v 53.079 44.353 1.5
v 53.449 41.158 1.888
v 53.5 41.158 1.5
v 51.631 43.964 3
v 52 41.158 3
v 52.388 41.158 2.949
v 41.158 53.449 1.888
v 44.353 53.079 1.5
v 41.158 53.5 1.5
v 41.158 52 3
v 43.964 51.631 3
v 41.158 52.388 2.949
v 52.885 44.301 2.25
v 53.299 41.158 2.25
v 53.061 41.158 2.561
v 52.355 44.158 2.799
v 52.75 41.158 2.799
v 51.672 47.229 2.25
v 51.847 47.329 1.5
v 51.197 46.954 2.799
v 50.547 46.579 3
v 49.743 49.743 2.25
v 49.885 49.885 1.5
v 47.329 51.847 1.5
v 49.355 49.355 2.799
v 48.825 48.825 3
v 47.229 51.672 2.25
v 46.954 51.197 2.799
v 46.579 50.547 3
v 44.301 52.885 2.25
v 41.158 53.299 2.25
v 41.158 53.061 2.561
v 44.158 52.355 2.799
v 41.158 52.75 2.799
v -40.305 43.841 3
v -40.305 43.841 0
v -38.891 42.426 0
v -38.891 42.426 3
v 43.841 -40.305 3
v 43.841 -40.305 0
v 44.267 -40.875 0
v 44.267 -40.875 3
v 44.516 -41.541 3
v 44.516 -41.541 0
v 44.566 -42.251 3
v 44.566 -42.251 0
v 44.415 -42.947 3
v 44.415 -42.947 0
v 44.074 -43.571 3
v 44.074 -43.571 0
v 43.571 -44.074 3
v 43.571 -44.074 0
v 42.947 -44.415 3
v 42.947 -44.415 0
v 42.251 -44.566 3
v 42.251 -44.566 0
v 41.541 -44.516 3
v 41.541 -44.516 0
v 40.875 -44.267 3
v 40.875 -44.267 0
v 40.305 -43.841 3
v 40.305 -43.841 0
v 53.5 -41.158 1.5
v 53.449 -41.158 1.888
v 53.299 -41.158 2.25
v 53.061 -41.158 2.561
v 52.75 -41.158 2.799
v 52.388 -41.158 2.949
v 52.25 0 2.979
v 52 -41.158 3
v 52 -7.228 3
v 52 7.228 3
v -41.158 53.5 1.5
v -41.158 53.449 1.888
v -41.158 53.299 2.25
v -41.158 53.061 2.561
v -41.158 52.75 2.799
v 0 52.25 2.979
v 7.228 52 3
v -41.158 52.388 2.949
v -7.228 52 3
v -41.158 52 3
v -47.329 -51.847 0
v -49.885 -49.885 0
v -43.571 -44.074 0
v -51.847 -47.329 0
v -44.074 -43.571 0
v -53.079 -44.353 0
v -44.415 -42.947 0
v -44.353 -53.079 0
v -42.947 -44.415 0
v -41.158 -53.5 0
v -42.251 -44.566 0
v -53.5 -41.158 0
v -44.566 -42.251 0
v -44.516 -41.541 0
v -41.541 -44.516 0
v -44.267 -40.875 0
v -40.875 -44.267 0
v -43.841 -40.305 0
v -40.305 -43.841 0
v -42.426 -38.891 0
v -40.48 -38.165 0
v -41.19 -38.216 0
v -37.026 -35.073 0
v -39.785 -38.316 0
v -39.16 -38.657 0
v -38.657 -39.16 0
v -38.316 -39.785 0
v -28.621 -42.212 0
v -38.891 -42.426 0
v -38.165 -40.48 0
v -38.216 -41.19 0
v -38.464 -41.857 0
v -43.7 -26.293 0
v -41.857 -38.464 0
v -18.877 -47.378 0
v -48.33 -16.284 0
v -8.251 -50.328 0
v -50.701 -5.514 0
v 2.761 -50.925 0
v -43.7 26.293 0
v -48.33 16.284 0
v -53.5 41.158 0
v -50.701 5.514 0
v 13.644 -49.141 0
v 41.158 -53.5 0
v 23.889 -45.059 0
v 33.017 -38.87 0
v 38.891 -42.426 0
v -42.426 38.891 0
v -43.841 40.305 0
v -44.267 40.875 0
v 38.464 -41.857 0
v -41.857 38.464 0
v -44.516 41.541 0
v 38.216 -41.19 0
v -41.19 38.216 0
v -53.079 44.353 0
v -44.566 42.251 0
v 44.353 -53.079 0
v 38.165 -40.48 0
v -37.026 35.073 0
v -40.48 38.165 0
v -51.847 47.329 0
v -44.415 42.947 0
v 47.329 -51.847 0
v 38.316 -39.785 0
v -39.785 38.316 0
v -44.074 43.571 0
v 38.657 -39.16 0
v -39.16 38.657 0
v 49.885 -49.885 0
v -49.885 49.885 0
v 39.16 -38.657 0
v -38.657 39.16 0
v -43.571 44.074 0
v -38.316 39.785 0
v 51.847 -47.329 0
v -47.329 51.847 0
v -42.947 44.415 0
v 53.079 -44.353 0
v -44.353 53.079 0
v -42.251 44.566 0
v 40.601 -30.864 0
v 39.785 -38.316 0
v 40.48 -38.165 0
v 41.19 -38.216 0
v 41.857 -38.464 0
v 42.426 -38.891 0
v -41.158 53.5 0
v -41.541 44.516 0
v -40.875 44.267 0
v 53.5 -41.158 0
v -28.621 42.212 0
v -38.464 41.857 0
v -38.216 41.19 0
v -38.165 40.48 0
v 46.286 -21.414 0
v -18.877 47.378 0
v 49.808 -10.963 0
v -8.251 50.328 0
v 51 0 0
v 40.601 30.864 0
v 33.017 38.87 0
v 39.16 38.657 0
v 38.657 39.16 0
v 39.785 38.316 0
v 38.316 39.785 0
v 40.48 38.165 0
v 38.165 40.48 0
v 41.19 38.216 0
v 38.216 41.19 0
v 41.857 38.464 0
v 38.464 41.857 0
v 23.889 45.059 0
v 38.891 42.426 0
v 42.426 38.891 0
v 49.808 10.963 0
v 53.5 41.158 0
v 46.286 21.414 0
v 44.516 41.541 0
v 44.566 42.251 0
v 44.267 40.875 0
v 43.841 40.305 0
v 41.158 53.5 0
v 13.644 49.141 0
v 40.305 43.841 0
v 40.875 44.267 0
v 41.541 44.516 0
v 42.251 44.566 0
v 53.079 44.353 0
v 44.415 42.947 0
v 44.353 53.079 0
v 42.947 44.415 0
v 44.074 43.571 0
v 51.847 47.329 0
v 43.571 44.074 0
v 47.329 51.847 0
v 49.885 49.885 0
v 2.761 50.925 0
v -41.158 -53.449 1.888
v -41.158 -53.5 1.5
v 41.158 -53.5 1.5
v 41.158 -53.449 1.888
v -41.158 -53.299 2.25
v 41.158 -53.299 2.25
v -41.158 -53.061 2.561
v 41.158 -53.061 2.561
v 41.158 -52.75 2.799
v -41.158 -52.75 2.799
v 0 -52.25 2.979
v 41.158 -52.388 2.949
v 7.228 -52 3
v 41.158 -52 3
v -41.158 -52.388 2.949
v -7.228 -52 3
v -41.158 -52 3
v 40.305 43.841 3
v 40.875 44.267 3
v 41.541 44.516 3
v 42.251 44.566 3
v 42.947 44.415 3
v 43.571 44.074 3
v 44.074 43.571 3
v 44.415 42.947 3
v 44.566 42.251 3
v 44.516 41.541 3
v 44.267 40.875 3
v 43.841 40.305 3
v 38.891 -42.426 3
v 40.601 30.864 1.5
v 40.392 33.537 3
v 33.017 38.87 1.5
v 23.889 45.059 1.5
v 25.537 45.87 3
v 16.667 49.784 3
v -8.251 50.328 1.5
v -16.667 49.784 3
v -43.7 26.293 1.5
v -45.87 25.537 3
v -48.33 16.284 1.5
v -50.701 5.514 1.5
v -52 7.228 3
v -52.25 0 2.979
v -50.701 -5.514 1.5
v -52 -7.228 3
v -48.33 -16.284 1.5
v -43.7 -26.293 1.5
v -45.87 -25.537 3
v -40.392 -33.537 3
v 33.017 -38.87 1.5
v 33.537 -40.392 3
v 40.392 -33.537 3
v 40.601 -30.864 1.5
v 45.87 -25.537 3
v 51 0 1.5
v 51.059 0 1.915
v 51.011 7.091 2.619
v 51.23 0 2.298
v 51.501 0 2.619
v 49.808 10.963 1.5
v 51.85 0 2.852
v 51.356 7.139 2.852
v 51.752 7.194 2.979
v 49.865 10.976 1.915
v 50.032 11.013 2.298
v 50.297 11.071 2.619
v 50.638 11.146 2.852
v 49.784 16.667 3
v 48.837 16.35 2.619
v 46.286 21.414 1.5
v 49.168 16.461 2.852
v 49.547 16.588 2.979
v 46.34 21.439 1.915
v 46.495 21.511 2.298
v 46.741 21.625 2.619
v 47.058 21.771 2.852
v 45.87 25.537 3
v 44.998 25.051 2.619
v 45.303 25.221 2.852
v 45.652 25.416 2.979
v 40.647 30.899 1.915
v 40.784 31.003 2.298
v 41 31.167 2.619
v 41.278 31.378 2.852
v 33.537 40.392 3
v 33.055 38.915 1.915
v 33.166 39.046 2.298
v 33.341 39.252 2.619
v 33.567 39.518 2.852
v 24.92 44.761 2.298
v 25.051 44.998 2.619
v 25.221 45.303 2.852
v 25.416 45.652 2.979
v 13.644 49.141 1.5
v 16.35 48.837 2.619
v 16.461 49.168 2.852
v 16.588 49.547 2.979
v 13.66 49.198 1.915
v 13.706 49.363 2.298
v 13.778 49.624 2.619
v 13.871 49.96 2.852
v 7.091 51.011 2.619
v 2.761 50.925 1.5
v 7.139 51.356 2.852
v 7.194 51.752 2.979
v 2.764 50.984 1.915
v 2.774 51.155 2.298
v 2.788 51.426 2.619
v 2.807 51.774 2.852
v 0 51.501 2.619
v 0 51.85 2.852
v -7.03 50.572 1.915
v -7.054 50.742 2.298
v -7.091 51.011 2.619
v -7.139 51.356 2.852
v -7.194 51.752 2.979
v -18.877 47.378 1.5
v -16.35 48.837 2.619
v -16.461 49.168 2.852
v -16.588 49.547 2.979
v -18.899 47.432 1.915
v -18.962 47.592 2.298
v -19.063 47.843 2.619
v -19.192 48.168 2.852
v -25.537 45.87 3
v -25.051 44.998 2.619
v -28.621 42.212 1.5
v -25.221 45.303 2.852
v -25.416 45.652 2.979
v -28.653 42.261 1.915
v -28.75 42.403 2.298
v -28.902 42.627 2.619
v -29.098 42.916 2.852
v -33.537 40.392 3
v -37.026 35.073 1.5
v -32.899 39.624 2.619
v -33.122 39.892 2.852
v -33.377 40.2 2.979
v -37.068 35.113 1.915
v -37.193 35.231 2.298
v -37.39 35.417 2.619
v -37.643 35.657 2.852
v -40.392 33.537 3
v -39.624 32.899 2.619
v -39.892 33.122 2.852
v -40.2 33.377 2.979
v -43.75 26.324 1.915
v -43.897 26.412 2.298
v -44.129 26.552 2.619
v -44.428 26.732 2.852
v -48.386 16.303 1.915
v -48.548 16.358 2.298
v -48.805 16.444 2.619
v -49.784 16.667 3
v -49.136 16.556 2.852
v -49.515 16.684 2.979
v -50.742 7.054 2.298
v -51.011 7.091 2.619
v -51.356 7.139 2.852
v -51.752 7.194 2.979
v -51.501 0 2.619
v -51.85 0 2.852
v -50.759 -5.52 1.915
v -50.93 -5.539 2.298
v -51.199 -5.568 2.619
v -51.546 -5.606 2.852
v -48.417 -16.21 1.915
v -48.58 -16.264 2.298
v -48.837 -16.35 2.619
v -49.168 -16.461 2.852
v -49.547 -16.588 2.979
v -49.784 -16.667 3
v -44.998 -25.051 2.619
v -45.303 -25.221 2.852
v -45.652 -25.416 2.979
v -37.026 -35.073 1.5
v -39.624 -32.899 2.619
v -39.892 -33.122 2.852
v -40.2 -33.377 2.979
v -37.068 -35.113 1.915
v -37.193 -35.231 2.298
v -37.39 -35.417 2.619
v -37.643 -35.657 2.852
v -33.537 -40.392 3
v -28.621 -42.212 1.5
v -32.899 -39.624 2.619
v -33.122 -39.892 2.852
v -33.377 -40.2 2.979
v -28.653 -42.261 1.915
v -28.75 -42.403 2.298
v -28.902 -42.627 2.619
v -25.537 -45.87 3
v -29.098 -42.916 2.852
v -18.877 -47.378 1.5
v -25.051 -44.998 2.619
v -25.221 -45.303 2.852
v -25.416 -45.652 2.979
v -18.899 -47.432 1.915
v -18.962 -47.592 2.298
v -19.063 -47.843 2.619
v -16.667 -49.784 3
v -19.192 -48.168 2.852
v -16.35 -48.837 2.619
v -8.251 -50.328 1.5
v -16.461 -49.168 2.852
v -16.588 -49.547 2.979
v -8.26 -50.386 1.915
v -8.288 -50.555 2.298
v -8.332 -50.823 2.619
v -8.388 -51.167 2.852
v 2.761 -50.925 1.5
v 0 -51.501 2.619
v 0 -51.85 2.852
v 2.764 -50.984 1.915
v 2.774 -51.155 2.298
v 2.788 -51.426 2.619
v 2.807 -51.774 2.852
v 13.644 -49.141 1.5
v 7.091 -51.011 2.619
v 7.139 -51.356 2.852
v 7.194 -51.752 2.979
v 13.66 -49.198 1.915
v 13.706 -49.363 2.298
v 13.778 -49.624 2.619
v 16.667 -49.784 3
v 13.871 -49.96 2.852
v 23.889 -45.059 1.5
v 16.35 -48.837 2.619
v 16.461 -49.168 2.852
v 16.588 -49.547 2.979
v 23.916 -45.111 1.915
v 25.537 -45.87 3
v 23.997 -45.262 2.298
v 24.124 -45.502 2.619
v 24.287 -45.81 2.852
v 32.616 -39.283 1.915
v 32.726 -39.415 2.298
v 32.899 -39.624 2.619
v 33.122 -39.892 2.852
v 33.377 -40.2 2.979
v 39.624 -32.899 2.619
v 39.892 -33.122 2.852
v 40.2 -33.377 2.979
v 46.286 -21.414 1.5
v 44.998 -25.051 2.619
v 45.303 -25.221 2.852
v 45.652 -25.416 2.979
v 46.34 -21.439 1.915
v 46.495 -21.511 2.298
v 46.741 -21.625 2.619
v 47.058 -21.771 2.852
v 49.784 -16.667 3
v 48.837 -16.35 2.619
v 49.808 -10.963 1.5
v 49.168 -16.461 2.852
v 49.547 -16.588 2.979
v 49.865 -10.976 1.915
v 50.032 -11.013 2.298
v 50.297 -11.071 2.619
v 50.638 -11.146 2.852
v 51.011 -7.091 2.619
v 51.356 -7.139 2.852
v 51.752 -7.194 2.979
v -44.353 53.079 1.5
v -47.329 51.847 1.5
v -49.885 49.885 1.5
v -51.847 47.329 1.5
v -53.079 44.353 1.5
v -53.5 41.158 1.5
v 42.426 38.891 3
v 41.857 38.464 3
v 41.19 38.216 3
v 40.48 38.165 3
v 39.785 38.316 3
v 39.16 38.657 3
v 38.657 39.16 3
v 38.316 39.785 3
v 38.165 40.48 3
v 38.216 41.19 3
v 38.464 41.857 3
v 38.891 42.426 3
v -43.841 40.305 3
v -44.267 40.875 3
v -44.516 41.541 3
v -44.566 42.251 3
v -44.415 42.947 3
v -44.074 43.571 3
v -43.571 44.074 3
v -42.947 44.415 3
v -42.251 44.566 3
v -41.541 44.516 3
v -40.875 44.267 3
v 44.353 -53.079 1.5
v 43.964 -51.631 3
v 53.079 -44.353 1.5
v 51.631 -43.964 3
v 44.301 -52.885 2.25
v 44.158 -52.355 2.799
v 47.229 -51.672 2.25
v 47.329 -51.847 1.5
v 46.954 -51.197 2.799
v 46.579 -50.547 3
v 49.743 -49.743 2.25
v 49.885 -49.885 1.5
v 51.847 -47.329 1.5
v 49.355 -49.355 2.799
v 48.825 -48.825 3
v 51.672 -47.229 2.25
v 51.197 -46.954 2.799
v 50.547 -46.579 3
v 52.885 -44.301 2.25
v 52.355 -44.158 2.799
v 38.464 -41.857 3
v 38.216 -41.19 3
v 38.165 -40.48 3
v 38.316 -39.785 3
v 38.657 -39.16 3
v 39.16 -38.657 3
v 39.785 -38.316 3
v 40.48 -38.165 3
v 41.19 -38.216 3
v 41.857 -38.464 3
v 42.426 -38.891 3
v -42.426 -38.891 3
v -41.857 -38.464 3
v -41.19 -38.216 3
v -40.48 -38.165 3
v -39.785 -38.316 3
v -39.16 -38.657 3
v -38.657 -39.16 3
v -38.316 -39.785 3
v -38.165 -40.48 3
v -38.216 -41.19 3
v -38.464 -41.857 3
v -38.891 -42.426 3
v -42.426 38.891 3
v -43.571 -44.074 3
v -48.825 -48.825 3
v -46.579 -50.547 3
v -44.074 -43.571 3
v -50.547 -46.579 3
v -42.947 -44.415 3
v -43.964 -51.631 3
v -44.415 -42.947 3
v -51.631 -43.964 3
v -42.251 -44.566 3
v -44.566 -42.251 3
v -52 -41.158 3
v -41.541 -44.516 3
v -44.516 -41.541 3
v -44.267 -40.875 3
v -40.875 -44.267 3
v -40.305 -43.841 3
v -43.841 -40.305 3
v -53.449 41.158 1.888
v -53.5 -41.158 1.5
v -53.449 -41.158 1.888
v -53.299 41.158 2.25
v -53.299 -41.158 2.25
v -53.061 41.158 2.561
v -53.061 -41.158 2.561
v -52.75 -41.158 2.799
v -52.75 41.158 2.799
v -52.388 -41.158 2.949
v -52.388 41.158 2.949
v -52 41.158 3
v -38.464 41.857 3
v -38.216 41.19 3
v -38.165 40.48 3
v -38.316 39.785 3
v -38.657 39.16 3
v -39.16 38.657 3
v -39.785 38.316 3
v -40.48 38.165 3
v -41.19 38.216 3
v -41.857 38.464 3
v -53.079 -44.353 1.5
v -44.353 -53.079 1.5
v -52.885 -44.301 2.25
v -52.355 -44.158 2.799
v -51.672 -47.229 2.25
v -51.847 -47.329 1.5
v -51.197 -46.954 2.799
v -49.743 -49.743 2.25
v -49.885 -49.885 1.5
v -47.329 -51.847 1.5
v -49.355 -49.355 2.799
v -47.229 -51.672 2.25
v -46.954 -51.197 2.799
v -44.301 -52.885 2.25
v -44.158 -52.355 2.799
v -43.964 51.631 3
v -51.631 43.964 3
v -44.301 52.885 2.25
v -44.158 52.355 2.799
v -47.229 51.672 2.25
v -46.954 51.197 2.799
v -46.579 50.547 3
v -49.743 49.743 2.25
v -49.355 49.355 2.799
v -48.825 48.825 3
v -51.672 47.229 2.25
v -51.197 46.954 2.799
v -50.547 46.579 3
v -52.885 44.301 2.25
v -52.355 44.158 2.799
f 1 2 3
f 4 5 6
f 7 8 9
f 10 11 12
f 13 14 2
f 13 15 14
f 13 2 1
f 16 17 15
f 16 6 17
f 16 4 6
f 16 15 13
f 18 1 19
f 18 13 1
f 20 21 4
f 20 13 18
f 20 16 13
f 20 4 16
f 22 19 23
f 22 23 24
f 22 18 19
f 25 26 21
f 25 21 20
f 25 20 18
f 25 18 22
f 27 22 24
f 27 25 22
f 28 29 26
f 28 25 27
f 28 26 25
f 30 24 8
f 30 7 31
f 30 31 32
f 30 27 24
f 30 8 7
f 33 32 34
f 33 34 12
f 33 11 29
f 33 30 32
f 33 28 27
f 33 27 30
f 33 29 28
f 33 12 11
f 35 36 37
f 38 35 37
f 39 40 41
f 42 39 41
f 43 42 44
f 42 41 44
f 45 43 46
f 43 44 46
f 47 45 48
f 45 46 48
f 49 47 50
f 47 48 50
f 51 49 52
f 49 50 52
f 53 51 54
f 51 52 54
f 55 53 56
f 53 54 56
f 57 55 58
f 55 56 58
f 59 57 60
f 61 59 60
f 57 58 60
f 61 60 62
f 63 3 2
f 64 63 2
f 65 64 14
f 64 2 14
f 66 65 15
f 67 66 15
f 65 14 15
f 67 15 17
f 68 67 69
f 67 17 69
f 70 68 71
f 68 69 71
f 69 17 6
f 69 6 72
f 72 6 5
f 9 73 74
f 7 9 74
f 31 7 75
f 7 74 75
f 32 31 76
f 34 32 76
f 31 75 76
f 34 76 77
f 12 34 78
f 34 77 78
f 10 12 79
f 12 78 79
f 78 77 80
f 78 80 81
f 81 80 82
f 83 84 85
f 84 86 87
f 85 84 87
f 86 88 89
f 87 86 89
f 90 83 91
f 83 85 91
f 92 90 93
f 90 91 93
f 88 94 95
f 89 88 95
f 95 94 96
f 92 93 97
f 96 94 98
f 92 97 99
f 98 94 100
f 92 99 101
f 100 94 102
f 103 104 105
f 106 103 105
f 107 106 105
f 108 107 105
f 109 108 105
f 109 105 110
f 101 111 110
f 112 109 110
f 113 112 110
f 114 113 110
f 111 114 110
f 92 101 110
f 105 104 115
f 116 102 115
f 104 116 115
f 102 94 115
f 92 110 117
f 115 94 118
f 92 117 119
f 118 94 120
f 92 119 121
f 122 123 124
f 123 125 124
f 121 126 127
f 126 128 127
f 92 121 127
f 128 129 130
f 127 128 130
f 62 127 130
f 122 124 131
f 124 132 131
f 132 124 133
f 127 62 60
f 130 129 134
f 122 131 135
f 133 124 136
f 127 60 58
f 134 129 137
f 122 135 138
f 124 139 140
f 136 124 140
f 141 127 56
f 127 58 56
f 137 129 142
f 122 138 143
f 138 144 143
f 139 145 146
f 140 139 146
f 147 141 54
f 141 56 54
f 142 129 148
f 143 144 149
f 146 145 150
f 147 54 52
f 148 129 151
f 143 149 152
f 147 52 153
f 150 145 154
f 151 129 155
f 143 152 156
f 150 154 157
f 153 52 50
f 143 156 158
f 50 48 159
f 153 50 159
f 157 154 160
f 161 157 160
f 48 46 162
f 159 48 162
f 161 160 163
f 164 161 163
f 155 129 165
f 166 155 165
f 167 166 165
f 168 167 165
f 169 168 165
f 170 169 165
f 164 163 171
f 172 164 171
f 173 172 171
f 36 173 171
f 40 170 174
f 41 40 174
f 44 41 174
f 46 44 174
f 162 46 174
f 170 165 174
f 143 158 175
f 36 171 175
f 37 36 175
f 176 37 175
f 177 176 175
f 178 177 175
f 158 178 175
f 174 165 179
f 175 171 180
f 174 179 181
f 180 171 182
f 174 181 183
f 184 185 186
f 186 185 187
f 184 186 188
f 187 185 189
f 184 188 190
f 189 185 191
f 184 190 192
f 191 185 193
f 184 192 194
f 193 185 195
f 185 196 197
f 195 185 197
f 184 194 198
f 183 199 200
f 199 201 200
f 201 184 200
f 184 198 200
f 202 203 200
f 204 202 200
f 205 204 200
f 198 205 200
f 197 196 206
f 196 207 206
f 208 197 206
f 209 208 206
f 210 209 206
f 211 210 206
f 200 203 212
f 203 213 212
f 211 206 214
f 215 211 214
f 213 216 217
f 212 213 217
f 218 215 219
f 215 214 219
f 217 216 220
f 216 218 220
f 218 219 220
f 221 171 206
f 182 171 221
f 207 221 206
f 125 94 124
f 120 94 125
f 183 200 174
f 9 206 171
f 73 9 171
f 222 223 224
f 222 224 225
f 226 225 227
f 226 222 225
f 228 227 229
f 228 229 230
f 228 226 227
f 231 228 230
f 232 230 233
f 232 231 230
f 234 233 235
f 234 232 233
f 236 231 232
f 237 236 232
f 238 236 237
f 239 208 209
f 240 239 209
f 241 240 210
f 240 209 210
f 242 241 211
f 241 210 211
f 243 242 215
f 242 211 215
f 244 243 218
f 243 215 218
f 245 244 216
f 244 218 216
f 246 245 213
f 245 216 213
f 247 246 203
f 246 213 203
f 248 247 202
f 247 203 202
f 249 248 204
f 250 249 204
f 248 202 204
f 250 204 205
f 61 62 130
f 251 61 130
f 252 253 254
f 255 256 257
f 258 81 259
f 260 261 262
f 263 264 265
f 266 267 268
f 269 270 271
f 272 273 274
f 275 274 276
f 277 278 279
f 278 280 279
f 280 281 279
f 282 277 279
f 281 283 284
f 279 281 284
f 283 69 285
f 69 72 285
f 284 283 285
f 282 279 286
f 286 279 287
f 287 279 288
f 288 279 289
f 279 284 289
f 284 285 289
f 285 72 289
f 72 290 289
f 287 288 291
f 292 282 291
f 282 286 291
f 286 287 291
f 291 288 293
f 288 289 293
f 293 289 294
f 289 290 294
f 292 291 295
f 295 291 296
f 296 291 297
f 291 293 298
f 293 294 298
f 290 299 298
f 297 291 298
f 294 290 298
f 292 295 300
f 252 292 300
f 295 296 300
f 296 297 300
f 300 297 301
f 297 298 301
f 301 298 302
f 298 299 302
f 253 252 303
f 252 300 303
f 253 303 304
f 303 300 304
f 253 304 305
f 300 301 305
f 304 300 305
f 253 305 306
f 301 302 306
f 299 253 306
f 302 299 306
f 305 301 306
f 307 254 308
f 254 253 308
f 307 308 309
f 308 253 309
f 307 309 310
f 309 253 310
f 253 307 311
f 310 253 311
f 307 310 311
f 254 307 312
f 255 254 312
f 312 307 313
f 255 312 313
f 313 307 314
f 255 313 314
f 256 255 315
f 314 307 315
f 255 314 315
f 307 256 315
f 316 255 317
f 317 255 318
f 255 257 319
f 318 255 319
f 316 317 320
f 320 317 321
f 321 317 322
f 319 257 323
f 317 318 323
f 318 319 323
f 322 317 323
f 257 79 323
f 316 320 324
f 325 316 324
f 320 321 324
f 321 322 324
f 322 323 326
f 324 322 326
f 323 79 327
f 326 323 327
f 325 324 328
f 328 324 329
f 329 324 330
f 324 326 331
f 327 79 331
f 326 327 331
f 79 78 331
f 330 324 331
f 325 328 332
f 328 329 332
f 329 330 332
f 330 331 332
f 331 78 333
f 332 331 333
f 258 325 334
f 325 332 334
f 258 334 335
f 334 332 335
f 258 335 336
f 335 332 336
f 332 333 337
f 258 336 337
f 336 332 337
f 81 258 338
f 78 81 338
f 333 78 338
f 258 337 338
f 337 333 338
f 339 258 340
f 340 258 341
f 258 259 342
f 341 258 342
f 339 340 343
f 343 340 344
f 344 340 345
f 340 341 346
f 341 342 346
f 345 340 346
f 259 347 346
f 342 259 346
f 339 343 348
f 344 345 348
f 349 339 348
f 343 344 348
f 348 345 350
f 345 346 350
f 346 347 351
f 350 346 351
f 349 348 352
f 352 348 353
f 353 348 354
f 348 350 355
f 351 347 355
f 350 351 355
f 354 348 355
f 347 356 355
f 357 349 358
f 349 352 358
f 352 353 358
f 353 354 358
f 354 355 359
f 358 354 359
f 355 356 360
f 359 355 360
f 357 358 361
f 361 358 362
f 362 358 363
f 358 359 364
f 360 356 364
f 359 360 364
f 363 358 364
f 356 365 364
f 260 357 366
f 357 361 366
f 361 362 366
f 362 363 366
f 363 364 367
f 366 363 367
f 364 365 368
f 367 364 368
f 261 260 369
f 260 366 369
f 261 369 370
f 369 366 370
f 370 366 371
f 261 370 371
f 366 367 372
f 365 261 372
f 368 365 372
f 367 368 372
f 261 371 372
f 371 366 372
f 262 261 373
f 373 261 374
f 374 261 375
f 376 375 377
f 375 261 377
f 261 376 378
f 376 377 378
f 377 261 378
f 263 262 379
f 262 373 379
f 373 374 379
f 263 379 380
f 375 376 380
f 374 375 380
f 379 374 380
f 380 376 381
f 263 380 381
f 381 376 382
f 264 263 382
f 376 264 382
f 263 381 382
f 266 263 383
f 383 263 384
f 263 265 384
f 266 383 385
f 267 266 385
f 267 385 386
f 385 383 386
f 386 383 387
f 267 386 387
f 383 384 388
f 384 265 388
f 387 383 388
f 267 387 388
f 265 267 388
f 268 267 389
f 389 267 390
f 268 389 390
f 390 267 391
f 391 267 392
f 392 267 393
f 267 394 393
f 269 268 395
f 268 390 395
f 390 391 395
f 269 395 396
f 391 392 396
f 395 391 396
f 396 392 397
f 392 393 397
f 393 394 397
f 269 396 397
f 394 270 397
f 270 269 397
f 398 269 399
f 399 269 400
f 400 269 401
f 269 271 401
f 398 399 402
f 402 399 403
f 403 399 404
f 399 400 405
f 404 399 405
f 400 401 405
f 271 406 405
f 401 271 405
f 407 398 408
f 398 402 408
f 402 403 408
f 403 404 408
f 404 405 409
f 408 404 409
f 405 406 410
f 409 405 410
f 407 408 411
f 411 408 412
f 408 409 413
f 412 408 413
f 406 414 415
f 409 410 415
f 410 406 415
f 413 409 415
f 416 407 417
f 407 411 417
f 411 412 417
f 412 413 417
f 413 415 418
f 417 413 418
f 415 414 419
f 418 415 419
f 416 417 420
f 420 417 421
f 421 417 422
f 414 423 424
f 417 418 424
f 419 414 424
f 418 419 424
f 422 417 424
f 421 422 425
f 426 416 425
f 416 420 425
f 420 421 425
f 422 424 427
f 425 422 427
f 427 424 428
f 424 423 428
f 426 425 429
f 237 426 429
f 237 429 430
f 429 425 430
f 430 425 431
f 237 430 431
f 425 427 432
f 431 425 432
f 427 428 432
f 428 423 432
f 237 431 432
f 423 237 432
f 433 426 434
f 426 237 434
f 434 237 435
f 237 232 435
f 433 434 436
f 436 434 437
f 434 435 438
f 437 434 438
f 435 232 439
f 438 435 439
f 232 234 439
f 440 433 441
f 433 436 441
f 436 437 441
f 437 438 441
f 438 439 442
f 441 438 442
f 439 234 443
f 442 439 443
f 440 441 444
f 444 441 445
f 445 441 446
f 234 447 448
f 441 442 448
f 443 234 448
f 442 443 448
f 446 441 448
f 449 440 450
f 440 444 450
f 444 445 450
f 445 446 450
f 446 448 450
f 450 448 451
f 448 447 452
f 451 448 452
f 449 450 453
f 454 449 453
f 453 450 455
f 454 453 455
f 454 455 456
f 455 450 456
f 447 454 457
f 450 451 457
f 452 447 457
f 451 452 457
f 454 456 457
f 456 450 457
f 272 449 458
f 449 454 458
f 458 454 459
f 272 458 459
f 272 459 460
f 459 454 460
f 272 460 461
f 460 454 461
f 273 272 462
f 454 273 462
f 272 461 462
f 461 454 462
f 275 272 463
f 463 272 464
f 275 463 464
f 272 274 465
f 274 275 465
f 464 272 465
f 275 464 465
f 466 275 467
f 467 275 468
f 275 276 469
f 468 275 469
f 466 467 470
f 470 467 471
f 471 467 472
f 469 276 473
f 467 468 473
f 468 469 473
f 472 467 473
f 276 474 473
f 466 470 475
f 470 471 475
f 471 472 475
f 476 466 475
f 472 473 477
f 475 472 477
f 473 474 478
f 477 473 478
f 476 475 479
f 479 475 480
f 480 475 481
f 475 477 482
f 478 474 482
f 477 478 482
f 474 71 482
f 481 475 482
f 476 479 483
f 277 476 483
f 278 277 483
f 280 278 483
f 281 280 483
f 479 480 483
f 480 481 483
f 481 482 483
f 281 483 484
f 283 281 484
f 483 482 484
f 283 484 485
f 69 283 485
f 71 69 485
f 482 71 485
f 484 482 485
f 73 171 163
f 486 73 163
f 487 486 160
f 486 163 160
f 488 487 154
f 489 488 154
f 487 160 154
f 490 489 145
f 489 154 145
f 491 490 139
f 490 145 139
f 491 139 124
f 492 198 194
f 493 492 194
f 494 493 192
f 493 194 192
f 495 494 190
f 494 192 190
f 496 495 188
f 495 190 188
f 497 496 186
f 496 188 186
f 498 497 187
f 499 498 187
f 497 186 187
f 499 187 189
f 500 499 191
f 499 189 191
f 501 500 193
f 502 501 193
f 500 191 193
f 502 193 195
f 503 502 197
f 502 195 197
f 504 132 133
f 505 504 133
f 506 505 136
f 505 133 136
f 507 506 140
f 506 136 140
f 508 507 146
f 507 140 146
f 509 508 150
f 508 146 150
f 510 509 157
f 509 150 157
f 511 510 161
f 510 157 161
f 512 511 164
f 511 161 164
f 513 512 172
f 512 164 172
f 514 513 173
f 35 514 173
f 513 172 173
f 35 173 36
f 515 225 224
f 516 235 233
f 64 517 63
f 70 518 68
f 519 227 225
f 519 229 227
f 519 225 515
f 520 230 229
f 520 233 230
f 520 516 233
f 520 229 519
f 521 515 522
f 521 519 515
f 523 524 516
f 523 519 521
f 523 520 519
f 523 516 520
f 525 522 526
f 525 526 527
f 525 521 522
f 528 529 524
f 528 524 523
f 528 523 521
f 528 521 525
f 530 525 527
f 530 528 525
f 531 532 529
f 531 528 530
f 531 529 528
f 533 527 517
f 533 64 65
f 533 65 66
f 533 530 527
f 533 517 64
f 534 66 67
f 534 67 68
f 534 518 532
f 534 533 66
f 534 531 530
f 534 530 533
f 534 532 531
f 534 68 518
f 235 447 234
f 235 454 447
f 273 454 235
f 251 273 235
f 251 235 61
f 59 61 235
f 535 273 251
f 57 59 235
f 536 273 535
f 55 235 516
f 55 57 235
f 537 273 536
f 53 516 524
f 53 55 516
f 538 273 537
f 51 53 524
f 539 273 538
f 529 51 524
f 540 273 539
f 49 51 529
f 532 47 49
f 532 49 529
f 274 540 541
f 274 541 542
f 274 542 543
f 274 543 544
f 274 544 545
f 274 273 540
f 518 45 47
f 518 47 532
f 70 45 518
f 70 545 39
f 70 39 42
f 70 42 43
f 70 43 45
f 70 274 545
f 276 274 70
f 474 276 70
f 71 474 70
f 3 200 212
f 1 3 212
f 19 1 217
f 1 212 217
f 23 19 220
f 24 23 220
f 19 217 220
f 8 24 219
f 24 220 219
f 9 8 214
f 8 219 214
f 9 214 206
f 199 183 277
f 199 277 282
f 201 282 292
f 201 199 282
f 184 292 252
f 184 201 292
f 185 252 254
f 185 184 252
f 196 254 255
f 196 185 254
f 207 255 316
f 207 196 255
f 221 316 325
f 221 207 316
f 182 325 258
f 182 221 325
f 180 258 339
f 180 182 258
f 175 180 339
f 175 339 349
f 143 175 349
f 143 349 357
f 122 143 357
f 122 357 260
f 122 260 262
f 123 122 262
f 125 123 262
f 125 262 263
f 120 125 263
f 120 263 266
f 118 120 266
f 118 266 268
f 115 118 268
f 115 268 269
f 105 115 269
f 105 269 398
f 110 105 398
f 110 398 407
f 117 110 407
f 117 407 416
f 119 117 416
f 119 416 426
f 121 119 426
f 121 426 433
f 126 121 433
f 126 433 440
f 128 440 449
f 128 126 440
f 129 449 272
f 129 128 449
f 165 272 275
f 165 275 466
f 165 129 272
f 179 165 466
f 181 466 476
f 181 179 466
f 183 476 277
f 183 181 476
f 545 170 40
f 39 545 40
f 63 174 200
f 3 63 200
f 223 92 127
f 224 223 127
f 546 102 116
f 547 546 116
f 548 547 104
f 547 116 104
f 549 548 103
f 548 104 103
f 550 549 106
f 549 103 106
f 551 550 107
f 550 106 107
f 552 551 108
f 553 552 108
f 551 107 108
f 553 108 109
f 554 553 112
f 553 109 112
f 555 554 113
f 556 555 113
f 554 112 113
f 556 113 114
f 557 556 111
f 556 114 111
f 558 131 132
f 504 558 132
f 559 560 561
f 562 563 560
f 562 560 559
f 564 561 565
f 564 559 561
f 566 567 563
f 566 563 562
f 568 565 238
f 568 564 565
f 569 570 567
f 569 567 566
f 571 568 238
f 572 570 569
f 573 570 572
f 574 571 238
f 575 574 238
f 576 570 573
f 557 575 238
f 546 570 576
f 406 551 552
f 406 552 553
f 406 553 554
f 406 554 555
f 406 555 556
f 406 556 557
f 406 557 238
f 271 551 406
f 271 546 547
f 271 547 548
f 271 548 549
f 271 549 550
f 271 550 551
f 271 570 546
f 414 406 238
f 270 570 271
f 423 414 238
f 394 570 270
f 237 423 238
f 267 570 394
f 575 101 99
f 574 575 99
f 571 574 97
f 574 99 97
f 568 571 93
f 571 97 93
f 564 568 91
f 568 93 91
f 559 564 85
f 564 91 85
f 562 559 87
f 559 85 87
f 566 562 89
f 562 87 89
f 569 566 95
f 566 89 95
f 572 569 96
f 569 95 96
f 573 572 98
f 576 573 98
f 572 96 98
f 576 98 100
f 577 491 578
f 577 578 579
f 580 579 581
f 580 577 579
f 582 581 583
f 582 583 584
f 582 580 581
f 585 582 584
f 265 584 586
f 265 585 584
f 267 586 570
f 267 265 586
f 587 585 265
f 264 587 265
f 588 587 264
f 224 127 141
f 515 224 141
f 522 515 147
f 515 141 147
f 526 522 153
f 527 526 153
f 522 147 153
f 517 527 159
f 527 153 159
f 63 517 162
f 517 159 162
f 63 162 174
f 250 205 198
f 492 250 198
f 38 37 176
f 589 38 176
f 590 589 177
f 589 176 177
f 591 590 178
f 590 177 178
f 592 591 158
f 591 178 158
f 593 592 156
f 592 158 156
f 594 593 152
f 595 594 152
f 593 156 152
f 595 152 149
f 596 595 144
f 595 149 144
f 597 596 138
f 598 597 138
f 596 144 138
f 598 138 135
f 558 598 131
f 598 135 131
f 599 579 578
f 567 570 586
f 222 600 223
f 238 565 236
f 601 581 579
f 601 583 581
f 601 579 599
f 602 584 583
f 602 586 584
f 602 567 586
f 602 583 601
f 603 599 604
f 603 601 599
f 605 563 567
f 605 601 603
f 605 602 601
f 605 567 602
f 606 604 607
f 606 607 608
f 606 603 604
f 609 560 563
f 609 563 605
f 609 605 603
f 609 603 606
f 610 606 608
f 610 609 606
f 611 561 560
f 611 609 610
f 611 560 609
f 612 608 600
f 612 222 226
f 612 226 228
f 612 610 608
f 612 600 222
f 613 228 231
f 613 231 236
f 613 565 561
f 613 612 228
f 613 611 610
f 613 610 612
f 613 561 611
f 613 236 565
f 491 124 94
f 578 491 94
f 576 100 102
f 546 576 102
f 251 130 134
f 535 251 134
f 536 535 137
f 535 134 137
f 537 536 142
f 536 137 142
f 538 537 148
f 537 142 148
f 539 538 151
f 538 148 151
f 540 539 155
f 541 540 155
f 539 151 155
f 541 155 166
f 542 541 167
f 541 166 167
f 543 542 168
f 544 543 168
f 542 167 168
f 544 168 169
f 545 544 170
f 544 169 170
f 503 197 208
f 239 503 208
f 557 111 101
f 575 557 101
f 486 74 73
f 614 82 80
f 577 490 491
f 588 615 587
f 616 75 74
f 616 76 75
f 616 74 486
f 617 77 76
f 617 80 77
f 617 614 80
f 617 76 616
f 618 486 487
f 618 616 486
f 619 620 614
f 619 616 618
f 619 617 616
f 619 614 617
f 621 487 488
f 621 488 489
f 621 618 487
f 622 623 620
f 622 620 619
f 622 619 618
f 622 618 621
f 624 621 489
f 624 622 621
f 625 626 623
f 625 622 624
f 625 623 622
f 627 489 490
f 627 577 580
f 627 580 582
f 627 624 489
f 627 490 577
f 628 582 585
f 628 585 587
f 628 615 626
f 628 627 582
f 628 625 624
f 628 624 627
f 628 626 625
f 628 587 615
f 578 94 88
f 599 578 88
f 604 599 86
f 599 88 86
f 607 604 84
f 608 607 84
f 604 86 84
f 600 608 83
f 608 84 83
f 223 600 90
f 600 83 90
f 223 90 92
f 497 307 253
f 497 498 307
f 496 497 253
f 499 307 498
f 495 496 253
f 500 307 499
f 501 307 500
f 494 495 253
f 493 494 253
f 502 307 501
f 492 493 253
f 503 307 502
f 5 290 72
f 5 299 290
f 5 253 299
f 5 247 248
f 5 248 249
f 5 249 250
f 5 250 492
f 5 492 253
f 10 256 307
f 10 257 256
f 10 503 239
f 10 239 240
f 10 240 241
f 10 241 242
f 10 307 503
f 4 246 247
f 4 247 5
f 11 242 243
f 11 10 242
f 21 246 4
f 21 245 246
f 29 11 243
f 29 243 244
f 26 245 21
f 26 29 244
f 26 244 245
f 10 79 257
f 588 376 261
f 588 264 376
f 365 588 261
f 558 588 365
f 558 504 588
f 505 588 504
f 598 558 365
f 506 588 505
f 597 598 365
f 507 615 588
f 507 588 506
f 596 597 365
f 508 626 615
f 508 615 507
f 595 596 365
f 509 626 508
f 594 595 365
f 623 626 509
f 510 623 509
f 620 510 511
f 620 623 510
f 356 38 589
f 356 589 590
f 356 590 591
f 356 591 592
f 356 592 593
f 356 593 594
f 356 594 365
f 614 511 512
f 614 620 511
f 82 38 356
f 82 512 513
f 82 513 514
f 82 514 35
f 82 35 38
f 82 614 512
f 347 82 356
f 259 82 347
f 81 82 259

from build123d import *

# Parameters (mm, degrees)
F0_R         = 51
F1_DEPTH     = 3
F2_T1_DEPTH  = 82.316462509
F2_T3_DEPTH  = 82.316462509
F2_T6_ANGLE  = 90
F2_T8_ANGLE  = 90
F2_T10_ANGLE = 90
F2_T12_ANGLE = 90


# Not quite as in the source:
# - a fillet or chamfer that OpenCascade refuses, or shapes differently, is made with other operations: its cross-section is extruded or revolved along the edge and cut away or added


with BuildPart() as f1:
    # F0 (on Top) → F1 (new body)
    with BuildSketch(Plane.XY):
        with BuildLine():
            Line((41.1582312545, 53.5), (-41.1582312545, 53.5))
            ThreePointArc((-41.1582312545, 53.5), (-49.8851796263, 49.8851796263), (-53.5, 41.1582312545))
            Line((-53.5, 41.1582312545), (-53.5, -41.1582312545))
            ThreePointArc((-53.5, -41.1582312545), (-49.8851796263, -49.8851796263), (-41.1582312545, -53.5))
            Line((-41.1582312545, -53.5), (41.1582312545, -53.5))
            ThreePointArc((41.1582312545, -53.5), (49.8851796263, -49.8851796263), (53.5, -41.1582312545))
            Line((53.5, -41.1582312545), (53.5, 41.1582312545))
            ThreePointArc((53.5, 41.1582312545), (49.8851796263, 49.8851796263), (41.1582312545, 53.5))
        make_face()
        with BuildLine():
            ThreePointArc((-40.3050865276, -43.8406204336), (-43.8406204336, -43.8406204336), (-43.8406204336, -40.3050865276))
            Line((-43.8406204336, -40.3050865276), (-42.4264068712, -38.8908729653))
            ThreePointArc((-42.4264068712, -38.8908729653), (-38.8908729653, -38.8908729653), (-38.8908729653, -42.4264068712))
            Line((-38.8908729653, -42.4264068712), (-40.3050865276, -43.8406204336))
        make_face(mode=Mode.SUBTRACT)
        Circle(F0_R, mode=Mode.SUBTRACT)
        with BuildLine():
            ThreePointArc((43.8406204336, -40.3050865276), (43.8406204336, -43.8406204336), (40.3050865276, -43.8406204336))
            Line((40.3050865276, -43.8406204336), (38.8908729653, -42.4264068712))
            ThreePointArc((38.8908729653, -42.4264068712), (38.8908729653, -38.8908729653), (42.4264068712, -38.8908729653))
            Line((42.4264068712, -38.8908729653), (43.8406204336, -40.3050865276))
        make_face(mode=Mode.SUBTRACT)
        with BuildLine():
            ThreePointArc((-43.8406204336, 40.3050865276), (-43.8406204336, 43.8406204336), (-40.3050865276, 43.8406204336))
            Line((-40.3050865276, 43.8406204336), (-38.8908729653, 42.4264068712))
            ThreePointArc((-38.8908729653, 42.4264068712), (-38.8908729653, 38.8908729653), (-42.4264068712, 38.8908729653))
            Line((-42.4264068712, 38.8908729653), (-43.8406204336, 40.3050865276))
        make_face(mode=Mode.SUBTRACT)
        with BuildLine():
            ThreePointArc((40.3050865276, 43.8406204336), (43.8406204336, 43.8406204336), (43.8406204336, 40.3050865276))
            Line((43.8406204336, 40.3050865276), (42.4264068712, 38.8908729653))
            ThreePointArc((42.4264068712, 38.8908729653), (38.8908729653, 38.8908729653), (38.8908729653, 42.4264068712))
            Line((38.8908729653, 42.4264068712), (40.3050865276, 43.8406204336))
        make_face(mode=Mode.SUBTRACT)
    extrude(amount=F1_DEPTH)

    # F2: fillet of radius 1.5 on 8 edges, made by hand

    # F2_s2 → F2_t1 (cut)
    with BuildSketch(Plane.XZ.offset(-41.1582312545)):
        with BuildLine():
            ThreePointArc((-53.5, 1.5), (-53.0606601718, 2.5606601718), (-52, 3))
            Line((-52, 3), (-53.5, 3))
            Line((-53.5, 3), (-53.5, 1.5))
        make_face()
        with BuildLine():
            ThreePointArc((53.5, 1.5), (53.0606601718, 2.5606601718), (52, 3))
            Line((52, 3), (53.5, 3))
            Line((53.5, 3), (53.5, 1.5))
        make_face()
    extrude(amount=F2_T1_DEPTH, mode=Mode.SUBTRACT)

    # F2_s4 → F2_t3 (cut)
    with BuildSketch(Plane.YZ.offset(-41.1582312545)):
        with BuildLine():
            ThreePointArc((53.5, 1.5), (53.0606601718, 2.5606601718), (52, 3))
            Line((52, 3), (53.5, 3))
            Line((53.5, 3), (53.5, 1.5))
        make_face()
        with BuildLine():
            ThreePointArc((-53.5, 1.5), (-53.0606601718, 2.5606601718), (-52, 3))
            Line((-52, 3), (-53.5, 3))
            Line((-53.5, 3), (-53.5, 1.5))
        make_face()
    extrude(amount=F2_T3_DEPTH, mode=Mode.SUBTRACT)

    # F2_s5 → F2_t6 (revolve, cut)
    with BuildSketch(Plane.YZ.offset(-41.1582312545)):
        with BuildLine():
            ThreePointArc((53.5, 1.5), (53.0606601718, 2.5606601718), (52, 3))
            Line((52, 3), (53.5, 3))
            Line((53.5, 3), (53.5, 1.5))
        make_face()
    revolve(axis=Axis((-41.1582312545, 41.1582312545, 3), (0, 0, 1)), revolution_arc=F2_T6_ANGLE, mode=Mode.SUBTRACT)

    # F2_s7 → F2_t8 (revolve, cut)
    with BuildSketch(Plane.XZ.offset(-41.1582312545)):
        with BuildLine():
            ThreePointArc((53.5, 1.5), (53.0606601718, 2.5606601718), (52, 3))
            Line((52, 3), (53.5, 3))
            Line((53.5, 3), (53.5, 1.5))
        make_face()
    revolve(axis=Axis((41.1582312545, 41.1582312545, 3), (0, 0, 1)), revolution_arc=F2_T8_ANGLE, mode=Mode.SUBTRACT)

    # F2_s9 → F2_t10 (revolve, cut)
    with BuildSketch(Plane.XZ.offset(41.1582312545)):
        with BuildLine():
            ThreePointArc((-53.5, 1.5), (-53.0606601718, 2.5606601718), (-52, 3))
            Line((-52, 3), (-53.5, 3))
            Line((-53.5, 3), (-53.5, 1.5))
        make_face()
    revolve(axis=Axis((-41.1582312545, -41.1582312545, 3), (0, 0, 1)), revolution_arc=F2_T10_ANGLE, mode=Mode.SUBTRACT)

    # F2_s11 → F2_t12 (revolve, cut)
    with BuildSketch(Plane.YZ.offset(41.1582312545)):
        with BuildLine():
            ThreePointArc((-53.5, 1.5), (-53.0606601718, 2.5606601718), (-52, 3))
            Line((-52, 3), (-53.5, 3))
            Line((-53.5, 3), (-53.5, 1.5))
        make_face()
    revolve(axis=Axis((41.1582312545, -41.1582312545, 3), (0, 0, 1)), revolution_arc=F2_T12_ANGLE, mode=Mode.SUBTRACT)

    # F2_s13 → F2_t14 (revolve, cut)
    with BuildSketch(Plane.XZ):
        with BuildLine():
            ThreePointArc((51, 1.5), (51.4393398282, 2.5606601718), (52.5, 3))
            Line((52.5, 3), (51, 3))
            Line((51, 3), (51, 1.5))
        make_face()
    revolve(axis=Axis((0, 0, 3), (0, 0, 1)), mode=Mode.SUBTRACT)


solid = f1.part
